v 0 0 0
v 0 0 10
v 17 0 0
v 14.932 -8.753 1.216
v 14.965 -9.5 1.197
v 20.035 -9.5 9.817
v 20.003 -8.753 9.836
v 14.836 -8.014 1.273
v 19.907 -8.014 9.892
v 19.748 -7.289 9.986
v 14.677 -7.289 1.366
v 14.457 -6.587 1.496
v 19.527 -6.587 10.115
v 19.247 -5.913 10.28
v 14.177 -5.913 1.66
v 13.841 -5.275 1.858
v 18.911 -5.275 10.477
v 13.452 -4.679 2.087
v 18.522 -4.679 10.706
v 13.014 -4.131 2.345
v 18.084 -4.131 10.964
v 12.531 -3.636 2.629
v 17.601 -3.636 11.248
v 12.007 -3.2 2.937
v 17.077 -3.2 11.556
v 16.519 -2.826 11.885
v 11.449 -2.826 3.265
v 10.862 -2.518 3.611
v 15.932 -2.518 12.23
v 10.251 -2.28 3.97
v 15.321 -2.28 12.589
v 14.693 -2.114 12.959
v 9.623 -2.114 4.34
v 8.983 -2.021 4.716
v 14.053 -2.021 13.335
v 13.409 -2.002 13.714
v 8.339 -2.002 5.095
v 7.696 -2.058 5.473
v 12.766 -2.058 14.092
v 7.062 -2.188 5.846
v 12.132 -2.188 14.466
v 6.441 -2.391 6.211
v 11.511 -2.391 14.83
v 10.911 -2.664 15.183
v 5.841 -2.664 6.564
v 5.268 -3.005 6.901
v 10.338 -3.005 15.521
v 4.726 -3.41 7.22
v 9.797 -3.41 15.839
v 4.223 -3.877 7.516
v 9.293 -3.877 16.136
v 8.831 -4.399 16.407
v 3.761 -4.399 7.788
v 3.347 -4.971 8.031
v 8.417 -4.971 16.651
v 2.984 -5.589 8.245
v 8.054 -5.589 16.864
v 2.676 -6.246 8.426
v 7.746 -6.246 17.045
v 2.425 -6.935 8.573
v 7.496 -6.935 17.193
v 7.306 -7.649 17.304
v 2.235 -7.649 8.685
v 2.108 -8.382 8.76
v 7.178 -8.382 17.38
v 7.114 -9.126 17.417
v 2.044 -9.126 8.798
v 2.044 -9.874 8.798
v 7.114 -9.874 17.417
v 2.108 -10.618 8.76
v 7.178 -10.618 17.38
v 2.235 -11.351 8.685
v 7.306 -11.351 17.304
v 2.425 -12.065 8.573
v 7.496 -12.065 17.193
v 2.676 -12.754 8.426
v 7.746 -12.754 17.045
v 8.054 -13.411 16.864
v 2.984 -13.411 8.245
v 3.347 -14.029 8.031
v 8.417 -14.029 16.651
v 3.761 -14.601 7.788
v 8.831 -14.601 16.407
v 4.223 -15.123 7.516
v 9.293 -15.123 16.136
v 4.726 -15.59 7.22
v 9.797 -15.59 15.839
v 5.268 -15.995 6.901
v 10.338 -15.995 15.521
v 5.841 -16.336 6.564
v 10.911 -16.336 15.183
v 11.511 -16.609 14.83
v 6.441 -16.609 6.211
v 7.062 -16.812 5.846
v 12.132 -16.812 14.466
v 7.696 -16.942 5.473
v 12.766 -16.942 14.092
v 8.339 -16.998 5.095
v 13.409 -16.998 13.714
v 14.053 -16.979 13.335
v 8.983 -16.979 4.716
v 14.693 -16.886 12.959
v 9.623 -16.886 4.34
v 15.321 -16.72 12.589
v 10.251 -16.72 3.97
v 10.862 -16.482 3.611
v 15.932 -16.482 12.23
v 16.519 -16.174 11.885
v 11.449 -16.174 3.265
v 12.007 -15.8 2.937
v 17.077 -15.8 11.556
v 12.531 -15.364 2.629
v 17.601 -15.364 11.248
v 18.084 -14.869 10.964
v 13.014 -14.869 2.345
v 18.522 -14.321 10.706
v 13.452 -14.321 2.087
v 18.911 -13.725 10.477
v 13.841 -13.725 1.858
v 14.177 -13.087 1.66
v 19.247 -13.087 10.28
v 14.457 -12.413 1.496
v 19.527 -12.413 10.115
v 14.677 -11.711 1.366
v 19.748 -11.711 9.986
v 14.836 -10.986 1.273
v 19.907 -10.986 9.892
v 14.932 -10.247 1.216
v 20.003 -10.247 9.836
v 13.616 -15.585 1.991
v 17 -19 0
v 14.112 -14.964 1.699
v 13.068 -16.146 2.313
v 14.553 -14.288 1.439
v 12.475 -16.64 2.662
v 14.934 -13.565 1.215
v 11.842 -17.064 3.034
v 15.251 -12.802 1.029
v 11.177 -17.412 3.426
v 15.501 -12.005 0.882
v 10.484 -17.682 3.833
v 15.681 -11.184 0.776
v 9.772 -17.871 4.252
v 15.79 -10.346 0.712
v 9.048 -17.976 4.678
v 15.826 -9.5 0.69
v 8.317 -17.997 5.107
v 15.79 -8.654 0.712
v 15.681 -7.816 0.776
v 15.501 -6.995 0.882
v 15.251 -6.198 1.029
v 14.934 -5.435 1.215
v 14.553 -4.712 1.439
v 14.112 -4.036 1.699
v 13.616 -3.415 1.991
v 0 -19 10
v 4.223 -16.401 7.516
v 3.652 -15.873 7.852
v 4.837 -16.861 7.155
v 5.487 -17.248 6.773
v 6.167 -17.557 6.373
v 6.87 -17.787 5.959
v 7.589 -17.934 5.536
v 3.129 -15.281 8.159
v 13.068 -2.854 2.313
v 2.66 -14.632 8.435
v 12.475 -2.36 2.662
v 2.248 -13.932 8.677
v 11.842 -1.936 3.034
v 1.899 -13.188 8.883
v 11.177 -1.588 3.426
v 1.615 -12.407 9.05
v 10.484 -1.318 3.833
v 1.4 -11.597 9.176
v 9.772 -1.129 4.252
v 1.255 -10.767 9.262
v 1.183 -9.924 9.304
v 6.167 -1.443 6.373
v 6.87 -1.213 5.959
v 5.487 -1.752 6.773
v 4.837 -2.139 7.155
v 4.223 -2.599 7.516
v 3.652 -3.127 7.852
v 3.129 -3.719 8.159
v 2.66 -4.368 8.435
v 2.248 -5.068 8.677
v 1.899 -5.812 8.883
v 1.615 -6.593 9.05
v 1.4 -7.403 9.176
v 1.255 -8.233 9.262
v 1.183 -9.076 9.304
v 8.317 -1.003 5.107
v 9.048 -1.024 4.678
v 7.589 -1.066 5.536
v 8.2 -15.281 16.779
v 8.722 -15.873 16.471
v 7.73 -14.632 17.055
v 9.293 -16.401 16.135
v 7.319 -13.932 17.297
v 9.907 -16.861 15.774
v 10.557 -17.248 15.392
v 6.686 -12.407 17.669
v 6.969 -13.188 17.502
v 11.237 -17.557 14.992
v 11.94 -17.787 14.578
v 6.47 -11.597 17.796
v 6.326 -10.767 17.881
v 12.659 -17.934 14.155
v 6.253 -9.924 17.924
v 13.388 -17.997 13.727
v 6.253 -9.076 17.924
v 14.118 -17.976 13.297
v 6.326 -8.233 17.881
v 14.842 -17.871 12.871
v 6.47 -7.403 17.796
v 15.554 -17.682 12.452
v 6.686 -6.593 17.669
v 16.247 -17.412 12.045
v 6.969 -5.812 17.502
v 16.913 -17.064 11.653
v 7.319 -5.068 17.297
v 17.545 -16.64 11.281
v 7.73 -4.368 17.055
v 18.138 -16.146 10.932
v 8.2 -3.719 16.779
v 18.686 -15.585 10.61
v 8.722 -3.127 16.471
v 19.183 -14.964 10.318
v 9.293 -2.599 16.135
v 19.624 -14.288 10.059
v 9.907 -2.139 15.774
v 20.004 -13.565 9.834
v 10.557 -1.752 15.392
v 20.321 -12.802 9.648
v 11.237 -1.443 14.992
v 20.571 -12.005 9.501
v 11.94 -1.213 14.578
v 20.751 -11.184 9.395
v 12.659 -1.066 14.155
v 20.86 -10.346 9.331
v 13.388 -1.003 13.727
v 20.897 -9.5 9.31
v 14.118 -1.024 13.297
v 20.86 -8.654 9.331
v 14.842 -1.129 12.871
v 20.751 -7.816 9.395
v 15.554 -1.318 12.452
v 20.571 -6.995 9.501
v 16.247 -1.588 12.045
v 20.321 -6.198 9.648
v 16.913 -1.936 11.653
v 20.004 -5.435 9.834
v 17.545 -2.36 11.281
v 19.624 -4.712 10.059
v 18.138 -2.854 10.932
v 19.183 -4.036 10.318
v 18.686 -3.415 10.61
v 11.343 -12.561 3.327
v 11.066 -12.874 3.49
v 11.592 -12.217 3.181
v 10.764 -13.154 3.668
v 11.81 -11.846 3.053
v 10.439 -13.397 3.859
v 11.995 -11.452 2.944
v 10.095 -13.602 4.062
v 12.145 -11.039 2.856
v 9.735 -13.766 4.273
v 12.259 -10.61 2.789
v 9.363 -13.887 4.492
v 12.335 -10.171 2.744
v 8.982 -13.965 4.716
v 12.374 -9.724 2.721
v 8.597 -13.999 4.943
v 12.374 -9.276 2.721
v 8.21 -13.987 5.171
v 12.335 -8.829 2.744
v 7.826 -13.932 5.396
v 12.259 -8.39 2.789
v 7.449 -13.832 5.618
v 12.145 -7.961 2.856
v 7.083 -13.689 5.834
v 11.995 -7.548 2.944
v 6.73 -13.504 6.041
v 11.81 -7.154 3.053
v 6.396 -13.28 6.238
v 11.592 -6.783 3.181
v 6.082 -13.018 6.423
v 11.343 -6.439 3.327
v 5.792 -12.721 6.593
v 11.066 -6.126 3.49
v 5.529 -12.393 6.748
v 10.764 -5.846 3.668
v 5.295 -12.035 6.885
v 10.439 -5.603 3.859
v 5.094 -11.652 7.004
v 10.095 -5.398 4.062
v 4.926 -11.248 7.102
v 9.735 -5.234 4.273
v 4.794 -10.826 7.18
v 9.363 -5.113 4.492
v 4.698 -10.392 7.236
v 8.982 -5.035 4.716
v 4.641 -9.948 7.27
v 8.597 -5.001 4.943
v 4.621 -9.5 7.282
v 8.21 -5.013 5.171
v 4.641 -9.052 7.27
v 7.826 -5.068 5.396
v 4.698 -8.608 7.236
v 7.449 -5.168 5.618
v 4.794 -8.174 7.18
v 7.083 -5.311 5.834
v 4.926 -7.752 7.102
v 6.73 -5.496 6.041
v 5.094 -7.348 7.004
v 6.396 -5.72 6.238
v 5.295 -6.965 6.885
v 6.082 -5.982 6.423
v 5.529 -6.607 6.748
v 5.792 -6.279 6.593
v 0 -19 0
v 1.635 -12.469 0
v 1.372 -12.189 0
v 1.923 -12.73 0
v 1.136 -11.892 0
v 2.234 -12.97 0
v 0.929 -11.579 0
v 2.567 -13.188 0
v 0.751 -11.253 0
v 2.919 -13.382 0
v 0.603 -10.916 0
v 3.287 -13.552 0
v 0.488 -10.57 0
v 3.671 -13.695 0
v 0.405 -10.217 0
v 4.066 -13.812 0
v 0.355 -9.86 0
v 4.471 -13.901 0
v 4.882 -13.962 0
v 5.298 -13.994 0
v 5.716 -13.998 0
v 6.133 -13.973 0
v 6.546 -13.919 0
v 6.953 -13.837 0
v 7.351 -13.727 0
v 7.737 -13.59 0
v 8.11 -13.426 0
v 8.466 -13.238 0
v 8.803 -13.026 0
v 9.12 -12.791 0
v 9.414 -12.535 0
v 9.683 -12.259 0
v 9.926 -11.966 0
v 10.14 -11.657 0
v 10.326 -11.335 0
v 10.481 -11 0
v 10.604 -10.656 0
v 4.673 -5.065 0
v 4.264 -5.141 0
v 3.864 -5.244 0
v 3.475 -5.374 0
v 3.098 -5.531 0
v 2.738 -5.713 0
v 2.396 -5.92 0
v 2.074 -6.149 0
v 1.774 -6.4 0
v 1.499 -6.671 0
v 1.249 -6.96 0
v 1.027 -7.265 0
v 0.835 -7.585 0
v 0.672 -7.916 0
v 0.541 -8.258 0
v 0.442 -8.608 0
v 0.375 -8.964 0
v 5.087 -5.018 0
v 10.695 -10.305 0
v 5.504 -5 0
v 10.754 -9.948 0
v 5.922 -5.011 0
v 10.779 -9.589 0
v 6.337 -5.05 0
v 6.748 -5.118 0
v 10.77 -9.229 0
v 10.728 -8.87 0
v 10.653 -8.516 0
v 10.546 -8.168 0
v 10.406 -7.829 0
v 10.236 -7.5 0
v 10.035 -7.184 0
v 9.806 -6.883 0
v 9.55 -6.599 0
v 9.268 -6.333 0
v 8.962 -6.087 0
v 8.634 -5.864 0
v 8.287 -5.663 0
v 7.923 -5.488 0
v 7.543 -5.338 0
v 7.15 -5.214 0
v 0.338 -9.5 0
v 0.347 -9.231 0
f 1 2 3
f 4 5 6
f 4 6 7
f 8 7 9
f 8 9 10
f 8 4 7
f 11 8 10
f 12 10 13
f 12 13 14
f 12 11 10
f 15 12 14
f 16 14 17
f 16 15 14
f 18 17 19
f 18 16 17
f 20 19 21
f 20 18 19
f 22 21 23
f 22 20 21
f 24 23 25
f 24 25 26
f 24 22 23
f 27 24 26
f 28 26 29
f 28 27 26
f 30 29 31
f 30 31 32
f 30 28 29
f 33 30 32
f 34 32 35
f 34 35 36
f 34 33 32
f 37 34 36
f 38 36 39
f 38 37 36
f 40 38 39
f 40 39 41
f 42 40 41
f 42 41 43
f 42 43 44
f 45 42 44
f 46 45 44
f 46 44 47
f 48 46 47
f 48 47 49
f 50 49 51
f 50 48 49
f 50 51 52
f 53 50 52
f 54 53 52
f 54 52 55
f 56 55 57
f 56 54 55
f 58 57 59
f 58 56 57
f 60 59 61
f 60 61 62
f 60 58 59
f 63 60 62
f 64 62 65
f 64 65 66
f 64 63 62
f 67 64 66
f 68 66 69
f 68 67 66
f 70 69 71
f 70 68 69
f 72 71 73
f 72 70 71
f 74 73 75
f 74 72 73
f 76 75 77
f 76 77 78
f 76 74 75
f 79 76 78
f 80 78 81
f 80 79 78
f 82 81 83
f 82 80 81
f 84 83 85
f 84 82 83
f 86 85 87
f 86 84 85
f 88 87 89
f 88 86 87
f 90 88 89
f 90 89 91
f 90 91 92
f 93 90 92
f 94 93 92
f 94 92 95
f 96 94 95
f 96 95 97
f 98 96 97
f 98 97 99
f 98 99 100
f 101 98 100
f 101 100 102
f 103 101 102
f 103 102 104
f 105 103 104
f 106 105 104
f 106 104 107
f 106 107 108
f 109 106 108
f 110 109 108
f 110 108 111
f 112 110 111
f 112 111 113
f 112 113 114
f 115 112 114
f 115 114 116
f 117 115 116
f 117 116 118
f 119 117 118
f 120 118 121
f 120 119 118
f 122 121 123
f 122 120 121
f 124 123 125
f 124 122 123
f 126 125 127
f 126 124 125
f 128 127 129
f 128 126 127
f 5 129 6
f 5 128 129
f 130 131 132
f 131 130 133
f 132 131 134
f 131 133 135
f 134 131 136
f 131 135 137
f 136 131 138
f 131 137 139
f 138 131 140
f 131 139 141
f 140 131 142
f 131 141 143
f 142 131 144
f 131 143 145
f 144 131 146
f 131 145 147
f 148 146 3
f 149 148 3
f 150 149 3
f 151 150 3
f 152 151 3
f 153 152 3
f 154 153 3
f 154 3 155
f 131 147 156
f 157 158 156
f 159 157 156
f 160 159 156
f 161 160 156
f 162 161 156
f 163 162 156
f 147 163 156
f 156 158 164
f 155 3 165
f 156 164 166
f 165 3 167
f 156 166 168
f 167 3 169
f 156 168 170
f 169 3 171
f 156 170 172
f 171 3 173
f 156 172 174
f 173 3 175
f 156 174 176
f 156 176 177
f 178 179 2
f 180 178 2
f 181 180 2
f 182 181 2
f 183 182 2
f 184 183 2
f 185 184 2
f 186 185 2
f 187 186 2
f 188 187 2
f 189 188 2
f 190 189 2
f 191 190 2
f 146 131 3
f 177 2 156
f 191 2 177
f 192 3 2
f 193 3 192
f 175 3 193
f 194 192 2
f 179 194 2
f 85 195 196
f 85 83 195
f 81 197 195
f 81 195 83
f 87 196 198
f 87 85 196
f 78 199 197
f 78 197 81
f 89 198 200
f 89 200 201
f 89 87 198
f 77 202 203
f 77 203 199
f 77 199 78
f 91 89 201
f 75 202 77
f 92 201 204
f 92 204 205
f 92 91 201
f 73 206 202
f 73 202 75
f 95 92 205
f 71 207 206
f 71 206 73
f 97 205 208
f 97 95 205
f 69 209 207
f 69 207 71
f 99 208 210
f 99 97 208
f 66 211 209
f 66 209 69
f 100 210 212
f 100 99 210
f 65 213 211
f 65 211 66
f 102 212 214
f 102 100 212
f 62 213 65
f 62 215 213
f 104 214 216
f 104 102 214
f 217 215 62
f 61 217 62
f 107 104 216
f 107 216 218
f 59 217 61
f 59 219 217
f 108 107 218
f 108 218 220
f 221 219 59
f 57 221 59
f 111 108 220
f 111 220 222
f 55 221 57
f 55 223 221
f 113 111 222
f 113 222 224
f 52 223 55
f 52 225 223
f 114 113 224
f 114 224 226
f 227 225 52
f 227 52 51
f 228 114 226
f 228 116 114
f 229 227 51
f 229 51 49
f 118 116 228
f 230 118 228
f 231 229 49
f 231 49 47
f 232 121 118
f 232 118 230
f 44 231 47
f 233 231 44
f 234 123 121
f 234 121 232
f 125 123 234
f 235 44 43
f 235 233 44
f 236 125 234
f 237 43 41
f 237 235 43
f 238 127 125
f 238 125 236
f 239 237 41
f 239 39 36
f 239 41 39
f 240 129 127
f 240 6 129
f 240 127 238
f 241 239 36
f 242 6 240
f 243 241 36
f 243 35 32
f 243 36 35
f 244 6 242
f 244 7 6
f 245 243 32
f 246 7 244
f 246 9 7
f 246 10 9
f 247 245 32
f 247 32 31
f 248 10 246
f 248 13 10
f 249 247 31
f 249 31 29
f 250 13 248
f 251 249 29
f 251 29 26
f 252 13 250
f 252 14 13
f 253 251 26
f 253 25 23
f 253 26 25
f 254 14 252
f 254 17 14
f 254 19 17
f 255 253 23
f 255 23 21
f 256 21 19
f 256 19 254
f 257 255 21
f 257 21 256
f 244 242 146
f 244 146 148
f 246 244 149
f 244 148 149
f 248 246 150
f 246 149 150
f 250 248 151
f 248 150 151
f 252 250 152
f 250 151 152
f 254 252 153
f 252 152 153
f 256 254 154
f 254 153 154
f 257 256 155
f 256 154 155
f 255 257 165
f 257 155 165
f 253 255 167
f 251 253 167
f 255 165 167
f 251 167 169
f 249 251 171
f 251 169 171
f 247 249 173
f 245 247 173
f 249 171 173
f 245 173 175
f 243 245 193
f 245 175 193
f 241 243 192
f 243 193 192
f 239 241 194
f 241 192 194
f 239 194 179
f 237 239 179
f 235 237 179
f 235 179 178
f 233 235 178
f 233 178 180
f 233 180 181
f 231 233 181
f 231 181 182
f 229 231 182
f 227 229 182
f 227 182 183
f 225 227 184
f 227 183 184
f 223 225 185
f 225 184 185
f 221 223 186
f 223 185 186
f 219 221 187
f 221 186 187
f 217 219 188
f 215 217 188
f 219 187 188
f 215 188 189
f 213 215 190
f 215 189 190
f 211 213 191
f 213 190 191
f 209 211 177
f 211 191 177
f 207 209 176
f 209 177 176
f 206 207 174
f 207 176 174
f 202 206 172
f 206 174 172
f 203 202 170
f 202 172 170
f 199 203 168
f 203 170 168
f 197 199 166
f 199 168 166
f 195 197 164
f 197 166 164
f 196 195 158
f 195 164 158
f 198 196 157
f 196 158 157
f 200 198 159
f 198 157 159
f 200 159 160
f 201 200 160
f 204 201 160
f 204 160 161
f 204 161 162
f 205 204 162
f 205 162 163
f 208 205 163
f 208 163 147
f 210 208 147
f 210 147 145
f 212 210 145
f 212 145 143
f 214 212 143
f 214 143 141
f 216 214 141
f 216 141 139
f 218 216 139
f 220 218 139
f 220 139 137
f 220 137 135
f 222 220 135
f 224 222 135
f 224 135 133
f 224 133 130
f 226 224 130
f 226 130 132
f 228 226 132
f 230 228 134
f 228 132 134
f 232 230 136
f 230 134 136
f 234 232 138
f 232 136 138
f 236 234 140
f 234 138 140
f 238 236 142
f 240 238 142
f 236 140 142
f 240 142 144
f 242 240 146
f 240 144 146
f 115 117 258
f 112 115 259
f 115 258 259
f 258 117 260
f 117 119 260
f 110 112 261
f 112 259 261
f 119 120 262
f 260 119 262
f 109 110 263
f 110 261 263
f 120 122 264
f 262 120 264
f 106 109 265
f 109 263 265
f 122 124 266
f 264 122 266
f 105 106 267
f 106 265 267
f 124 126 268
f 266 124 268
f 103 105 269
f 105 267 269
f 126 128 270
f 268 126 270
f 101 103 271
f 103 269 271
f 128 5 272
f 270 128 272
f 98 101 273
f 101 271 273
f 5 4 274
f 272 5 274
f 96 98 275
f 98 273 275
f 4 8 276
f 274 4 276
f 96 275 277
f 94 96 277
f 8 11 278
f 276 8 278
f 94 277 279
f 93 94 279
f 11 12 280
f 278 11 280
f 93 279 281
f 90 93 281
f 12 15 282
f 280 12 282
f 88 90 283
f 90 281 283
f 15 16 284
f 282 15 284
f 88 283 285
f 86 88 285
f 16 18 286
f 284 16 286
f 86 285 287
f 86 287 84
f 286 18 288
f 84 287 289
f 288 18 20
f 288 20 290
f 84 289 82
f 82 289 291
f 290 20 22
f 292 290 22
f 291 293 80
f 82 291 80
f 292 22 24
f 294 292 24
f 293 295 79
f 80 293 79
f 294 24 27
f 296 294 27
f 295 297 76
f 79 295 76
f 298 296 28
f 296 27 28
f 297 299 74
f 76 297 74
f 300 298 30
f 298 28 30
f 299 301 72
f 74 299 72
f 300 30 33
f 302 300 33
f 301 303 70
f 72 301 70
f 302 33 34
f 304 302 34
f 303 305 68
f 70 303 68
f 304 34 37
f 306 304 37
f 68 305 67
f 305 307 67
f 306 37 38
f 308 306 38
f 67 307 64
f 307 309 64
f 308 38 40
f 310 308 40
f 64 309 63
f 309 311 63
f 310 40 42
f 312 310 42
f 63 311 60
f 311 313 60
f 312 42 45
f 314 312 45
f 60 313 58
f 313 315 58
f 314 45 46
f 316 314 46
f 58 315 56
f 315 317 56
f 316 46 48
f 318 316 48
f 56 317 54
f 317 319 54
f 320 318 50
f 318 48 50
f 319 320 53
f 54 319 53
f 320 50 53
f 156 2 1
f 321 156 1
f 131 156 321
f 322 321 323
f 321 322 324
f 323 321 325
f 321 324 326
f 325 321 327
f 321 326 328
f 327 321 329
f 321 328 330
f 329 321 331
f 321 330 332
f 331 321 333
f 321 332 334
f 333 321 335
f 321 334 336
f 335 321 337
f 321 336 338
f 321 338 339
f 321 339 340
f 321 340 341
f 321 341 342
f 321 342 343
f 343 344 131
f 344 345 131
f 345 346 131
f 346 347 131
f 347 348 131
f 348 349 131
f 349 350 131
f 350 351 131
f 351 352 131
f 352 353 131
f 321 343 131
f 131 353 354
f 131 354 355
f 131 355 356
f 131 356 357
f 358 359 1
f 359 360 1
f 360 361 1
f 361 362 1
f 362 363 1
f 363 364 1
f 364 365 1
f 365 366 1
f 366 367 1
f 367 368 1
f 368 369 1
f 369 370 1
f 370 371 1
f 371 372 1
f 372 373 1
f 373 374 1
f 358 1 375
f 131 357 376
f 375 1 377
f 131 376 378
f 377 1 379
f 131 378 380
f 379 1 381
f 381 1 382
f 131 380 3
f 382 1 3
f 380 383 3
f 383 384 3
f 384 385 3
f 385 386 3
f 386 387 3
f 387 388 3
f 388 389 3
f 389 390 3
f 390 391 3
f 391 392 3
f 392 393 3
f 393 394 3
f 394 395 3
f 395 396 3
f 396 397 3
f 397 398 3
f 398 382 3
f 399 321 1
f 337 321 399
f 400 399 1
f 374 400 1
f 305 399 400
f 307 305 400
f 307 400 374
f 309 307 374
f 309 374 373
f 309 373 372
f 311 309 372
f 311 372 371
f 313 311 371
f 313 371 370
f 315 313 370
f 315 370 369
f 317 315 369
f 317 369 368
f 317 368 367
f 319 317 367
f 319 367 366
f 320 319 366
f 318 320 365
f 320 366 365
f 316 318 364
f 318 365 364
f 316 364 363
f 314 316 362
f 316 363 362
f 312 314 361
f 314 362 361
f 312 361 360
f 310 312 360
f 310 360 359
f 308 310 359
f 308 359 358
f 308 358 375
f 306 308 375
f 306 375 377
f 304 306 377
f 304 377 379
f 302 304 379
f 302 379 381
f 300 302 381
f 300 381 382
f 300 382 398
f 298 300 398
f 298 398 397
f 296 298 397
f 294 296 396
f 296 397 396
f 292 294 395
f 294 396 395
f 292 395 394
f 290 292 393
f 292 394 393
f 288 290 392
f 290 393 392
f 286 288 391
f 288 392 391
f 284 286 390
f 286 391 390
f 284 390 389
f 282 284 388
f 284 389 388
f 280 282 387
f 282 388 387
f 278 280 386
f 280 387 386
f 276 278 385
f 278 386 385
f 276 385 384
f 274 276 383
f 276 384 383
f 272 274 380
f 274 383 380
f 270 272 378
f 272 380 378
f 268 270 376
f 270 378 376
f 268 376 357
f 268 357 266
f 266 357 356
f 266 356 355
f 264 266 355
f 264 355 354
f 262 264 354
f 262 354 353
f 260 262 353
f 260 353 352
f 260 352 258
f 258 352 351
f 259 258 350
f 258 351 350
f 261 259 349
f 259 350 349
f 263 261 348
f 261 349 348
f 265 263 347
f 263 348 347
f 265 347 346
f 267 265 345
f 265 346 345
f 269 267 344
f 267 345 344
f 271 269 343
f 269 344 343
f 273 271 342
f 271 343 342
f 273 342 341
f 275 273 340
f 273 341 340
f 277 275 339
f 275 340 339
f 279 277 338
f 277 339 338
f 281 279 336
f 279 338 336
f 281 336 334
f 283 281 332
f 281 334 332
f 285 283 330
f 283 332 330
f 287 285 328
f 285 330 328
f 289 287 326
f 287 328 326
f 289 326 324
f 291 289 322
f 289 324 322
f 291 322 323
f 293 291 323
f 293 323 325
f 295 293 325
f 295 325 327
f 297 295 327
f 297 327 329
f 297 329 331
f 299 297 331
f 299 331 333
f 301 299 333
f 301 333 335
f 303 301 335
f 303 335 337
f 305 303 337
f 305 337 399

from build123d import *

# Parameters (mm, degrees)
F1_DEPTH = 19
F3_D     = 9
F3_DEPTH = 30
F2_R     = 8.5
F2_R_2   = 7.5
F4_DEPTH = 10


with BuildPart() as f1:
    # F0 (on Front) → F1 (new body)
    with BuildSketch(Plane.XZ):
        Polygon((0, 10), (0, 0), (17, 0), align=None)
    extrude(amount=F1_DEPTH)

    # F3
    with Locations(Plane(origin=(4.37018, 0, 7.429306), x_dir=(0.861934, 0, -0.50702), z_dir=(0.50702, 0, 0.861934))):
        with Locations((4.79134, -9.5)):
            Hole(F3_D / 2, depth=F3_DEPTH)

    # F2 (on face) → F4 (join)
    with BuildSketch(Plane(origin=(4.37018, 0, 7.429306), x_dir=(0.861934, 0, -0.50702), z_dir=(0.50702, 0, 0.861934))):
        with Locations((4.79134, -9.5)):
            Circle(F2_R)
        with Locations((4.79134, -9.5)):
            Circle(F2_R_2, mode=Mode.SUBTRACT)
    extrude(amount=F4_DEPTH)


solid = f1.part
